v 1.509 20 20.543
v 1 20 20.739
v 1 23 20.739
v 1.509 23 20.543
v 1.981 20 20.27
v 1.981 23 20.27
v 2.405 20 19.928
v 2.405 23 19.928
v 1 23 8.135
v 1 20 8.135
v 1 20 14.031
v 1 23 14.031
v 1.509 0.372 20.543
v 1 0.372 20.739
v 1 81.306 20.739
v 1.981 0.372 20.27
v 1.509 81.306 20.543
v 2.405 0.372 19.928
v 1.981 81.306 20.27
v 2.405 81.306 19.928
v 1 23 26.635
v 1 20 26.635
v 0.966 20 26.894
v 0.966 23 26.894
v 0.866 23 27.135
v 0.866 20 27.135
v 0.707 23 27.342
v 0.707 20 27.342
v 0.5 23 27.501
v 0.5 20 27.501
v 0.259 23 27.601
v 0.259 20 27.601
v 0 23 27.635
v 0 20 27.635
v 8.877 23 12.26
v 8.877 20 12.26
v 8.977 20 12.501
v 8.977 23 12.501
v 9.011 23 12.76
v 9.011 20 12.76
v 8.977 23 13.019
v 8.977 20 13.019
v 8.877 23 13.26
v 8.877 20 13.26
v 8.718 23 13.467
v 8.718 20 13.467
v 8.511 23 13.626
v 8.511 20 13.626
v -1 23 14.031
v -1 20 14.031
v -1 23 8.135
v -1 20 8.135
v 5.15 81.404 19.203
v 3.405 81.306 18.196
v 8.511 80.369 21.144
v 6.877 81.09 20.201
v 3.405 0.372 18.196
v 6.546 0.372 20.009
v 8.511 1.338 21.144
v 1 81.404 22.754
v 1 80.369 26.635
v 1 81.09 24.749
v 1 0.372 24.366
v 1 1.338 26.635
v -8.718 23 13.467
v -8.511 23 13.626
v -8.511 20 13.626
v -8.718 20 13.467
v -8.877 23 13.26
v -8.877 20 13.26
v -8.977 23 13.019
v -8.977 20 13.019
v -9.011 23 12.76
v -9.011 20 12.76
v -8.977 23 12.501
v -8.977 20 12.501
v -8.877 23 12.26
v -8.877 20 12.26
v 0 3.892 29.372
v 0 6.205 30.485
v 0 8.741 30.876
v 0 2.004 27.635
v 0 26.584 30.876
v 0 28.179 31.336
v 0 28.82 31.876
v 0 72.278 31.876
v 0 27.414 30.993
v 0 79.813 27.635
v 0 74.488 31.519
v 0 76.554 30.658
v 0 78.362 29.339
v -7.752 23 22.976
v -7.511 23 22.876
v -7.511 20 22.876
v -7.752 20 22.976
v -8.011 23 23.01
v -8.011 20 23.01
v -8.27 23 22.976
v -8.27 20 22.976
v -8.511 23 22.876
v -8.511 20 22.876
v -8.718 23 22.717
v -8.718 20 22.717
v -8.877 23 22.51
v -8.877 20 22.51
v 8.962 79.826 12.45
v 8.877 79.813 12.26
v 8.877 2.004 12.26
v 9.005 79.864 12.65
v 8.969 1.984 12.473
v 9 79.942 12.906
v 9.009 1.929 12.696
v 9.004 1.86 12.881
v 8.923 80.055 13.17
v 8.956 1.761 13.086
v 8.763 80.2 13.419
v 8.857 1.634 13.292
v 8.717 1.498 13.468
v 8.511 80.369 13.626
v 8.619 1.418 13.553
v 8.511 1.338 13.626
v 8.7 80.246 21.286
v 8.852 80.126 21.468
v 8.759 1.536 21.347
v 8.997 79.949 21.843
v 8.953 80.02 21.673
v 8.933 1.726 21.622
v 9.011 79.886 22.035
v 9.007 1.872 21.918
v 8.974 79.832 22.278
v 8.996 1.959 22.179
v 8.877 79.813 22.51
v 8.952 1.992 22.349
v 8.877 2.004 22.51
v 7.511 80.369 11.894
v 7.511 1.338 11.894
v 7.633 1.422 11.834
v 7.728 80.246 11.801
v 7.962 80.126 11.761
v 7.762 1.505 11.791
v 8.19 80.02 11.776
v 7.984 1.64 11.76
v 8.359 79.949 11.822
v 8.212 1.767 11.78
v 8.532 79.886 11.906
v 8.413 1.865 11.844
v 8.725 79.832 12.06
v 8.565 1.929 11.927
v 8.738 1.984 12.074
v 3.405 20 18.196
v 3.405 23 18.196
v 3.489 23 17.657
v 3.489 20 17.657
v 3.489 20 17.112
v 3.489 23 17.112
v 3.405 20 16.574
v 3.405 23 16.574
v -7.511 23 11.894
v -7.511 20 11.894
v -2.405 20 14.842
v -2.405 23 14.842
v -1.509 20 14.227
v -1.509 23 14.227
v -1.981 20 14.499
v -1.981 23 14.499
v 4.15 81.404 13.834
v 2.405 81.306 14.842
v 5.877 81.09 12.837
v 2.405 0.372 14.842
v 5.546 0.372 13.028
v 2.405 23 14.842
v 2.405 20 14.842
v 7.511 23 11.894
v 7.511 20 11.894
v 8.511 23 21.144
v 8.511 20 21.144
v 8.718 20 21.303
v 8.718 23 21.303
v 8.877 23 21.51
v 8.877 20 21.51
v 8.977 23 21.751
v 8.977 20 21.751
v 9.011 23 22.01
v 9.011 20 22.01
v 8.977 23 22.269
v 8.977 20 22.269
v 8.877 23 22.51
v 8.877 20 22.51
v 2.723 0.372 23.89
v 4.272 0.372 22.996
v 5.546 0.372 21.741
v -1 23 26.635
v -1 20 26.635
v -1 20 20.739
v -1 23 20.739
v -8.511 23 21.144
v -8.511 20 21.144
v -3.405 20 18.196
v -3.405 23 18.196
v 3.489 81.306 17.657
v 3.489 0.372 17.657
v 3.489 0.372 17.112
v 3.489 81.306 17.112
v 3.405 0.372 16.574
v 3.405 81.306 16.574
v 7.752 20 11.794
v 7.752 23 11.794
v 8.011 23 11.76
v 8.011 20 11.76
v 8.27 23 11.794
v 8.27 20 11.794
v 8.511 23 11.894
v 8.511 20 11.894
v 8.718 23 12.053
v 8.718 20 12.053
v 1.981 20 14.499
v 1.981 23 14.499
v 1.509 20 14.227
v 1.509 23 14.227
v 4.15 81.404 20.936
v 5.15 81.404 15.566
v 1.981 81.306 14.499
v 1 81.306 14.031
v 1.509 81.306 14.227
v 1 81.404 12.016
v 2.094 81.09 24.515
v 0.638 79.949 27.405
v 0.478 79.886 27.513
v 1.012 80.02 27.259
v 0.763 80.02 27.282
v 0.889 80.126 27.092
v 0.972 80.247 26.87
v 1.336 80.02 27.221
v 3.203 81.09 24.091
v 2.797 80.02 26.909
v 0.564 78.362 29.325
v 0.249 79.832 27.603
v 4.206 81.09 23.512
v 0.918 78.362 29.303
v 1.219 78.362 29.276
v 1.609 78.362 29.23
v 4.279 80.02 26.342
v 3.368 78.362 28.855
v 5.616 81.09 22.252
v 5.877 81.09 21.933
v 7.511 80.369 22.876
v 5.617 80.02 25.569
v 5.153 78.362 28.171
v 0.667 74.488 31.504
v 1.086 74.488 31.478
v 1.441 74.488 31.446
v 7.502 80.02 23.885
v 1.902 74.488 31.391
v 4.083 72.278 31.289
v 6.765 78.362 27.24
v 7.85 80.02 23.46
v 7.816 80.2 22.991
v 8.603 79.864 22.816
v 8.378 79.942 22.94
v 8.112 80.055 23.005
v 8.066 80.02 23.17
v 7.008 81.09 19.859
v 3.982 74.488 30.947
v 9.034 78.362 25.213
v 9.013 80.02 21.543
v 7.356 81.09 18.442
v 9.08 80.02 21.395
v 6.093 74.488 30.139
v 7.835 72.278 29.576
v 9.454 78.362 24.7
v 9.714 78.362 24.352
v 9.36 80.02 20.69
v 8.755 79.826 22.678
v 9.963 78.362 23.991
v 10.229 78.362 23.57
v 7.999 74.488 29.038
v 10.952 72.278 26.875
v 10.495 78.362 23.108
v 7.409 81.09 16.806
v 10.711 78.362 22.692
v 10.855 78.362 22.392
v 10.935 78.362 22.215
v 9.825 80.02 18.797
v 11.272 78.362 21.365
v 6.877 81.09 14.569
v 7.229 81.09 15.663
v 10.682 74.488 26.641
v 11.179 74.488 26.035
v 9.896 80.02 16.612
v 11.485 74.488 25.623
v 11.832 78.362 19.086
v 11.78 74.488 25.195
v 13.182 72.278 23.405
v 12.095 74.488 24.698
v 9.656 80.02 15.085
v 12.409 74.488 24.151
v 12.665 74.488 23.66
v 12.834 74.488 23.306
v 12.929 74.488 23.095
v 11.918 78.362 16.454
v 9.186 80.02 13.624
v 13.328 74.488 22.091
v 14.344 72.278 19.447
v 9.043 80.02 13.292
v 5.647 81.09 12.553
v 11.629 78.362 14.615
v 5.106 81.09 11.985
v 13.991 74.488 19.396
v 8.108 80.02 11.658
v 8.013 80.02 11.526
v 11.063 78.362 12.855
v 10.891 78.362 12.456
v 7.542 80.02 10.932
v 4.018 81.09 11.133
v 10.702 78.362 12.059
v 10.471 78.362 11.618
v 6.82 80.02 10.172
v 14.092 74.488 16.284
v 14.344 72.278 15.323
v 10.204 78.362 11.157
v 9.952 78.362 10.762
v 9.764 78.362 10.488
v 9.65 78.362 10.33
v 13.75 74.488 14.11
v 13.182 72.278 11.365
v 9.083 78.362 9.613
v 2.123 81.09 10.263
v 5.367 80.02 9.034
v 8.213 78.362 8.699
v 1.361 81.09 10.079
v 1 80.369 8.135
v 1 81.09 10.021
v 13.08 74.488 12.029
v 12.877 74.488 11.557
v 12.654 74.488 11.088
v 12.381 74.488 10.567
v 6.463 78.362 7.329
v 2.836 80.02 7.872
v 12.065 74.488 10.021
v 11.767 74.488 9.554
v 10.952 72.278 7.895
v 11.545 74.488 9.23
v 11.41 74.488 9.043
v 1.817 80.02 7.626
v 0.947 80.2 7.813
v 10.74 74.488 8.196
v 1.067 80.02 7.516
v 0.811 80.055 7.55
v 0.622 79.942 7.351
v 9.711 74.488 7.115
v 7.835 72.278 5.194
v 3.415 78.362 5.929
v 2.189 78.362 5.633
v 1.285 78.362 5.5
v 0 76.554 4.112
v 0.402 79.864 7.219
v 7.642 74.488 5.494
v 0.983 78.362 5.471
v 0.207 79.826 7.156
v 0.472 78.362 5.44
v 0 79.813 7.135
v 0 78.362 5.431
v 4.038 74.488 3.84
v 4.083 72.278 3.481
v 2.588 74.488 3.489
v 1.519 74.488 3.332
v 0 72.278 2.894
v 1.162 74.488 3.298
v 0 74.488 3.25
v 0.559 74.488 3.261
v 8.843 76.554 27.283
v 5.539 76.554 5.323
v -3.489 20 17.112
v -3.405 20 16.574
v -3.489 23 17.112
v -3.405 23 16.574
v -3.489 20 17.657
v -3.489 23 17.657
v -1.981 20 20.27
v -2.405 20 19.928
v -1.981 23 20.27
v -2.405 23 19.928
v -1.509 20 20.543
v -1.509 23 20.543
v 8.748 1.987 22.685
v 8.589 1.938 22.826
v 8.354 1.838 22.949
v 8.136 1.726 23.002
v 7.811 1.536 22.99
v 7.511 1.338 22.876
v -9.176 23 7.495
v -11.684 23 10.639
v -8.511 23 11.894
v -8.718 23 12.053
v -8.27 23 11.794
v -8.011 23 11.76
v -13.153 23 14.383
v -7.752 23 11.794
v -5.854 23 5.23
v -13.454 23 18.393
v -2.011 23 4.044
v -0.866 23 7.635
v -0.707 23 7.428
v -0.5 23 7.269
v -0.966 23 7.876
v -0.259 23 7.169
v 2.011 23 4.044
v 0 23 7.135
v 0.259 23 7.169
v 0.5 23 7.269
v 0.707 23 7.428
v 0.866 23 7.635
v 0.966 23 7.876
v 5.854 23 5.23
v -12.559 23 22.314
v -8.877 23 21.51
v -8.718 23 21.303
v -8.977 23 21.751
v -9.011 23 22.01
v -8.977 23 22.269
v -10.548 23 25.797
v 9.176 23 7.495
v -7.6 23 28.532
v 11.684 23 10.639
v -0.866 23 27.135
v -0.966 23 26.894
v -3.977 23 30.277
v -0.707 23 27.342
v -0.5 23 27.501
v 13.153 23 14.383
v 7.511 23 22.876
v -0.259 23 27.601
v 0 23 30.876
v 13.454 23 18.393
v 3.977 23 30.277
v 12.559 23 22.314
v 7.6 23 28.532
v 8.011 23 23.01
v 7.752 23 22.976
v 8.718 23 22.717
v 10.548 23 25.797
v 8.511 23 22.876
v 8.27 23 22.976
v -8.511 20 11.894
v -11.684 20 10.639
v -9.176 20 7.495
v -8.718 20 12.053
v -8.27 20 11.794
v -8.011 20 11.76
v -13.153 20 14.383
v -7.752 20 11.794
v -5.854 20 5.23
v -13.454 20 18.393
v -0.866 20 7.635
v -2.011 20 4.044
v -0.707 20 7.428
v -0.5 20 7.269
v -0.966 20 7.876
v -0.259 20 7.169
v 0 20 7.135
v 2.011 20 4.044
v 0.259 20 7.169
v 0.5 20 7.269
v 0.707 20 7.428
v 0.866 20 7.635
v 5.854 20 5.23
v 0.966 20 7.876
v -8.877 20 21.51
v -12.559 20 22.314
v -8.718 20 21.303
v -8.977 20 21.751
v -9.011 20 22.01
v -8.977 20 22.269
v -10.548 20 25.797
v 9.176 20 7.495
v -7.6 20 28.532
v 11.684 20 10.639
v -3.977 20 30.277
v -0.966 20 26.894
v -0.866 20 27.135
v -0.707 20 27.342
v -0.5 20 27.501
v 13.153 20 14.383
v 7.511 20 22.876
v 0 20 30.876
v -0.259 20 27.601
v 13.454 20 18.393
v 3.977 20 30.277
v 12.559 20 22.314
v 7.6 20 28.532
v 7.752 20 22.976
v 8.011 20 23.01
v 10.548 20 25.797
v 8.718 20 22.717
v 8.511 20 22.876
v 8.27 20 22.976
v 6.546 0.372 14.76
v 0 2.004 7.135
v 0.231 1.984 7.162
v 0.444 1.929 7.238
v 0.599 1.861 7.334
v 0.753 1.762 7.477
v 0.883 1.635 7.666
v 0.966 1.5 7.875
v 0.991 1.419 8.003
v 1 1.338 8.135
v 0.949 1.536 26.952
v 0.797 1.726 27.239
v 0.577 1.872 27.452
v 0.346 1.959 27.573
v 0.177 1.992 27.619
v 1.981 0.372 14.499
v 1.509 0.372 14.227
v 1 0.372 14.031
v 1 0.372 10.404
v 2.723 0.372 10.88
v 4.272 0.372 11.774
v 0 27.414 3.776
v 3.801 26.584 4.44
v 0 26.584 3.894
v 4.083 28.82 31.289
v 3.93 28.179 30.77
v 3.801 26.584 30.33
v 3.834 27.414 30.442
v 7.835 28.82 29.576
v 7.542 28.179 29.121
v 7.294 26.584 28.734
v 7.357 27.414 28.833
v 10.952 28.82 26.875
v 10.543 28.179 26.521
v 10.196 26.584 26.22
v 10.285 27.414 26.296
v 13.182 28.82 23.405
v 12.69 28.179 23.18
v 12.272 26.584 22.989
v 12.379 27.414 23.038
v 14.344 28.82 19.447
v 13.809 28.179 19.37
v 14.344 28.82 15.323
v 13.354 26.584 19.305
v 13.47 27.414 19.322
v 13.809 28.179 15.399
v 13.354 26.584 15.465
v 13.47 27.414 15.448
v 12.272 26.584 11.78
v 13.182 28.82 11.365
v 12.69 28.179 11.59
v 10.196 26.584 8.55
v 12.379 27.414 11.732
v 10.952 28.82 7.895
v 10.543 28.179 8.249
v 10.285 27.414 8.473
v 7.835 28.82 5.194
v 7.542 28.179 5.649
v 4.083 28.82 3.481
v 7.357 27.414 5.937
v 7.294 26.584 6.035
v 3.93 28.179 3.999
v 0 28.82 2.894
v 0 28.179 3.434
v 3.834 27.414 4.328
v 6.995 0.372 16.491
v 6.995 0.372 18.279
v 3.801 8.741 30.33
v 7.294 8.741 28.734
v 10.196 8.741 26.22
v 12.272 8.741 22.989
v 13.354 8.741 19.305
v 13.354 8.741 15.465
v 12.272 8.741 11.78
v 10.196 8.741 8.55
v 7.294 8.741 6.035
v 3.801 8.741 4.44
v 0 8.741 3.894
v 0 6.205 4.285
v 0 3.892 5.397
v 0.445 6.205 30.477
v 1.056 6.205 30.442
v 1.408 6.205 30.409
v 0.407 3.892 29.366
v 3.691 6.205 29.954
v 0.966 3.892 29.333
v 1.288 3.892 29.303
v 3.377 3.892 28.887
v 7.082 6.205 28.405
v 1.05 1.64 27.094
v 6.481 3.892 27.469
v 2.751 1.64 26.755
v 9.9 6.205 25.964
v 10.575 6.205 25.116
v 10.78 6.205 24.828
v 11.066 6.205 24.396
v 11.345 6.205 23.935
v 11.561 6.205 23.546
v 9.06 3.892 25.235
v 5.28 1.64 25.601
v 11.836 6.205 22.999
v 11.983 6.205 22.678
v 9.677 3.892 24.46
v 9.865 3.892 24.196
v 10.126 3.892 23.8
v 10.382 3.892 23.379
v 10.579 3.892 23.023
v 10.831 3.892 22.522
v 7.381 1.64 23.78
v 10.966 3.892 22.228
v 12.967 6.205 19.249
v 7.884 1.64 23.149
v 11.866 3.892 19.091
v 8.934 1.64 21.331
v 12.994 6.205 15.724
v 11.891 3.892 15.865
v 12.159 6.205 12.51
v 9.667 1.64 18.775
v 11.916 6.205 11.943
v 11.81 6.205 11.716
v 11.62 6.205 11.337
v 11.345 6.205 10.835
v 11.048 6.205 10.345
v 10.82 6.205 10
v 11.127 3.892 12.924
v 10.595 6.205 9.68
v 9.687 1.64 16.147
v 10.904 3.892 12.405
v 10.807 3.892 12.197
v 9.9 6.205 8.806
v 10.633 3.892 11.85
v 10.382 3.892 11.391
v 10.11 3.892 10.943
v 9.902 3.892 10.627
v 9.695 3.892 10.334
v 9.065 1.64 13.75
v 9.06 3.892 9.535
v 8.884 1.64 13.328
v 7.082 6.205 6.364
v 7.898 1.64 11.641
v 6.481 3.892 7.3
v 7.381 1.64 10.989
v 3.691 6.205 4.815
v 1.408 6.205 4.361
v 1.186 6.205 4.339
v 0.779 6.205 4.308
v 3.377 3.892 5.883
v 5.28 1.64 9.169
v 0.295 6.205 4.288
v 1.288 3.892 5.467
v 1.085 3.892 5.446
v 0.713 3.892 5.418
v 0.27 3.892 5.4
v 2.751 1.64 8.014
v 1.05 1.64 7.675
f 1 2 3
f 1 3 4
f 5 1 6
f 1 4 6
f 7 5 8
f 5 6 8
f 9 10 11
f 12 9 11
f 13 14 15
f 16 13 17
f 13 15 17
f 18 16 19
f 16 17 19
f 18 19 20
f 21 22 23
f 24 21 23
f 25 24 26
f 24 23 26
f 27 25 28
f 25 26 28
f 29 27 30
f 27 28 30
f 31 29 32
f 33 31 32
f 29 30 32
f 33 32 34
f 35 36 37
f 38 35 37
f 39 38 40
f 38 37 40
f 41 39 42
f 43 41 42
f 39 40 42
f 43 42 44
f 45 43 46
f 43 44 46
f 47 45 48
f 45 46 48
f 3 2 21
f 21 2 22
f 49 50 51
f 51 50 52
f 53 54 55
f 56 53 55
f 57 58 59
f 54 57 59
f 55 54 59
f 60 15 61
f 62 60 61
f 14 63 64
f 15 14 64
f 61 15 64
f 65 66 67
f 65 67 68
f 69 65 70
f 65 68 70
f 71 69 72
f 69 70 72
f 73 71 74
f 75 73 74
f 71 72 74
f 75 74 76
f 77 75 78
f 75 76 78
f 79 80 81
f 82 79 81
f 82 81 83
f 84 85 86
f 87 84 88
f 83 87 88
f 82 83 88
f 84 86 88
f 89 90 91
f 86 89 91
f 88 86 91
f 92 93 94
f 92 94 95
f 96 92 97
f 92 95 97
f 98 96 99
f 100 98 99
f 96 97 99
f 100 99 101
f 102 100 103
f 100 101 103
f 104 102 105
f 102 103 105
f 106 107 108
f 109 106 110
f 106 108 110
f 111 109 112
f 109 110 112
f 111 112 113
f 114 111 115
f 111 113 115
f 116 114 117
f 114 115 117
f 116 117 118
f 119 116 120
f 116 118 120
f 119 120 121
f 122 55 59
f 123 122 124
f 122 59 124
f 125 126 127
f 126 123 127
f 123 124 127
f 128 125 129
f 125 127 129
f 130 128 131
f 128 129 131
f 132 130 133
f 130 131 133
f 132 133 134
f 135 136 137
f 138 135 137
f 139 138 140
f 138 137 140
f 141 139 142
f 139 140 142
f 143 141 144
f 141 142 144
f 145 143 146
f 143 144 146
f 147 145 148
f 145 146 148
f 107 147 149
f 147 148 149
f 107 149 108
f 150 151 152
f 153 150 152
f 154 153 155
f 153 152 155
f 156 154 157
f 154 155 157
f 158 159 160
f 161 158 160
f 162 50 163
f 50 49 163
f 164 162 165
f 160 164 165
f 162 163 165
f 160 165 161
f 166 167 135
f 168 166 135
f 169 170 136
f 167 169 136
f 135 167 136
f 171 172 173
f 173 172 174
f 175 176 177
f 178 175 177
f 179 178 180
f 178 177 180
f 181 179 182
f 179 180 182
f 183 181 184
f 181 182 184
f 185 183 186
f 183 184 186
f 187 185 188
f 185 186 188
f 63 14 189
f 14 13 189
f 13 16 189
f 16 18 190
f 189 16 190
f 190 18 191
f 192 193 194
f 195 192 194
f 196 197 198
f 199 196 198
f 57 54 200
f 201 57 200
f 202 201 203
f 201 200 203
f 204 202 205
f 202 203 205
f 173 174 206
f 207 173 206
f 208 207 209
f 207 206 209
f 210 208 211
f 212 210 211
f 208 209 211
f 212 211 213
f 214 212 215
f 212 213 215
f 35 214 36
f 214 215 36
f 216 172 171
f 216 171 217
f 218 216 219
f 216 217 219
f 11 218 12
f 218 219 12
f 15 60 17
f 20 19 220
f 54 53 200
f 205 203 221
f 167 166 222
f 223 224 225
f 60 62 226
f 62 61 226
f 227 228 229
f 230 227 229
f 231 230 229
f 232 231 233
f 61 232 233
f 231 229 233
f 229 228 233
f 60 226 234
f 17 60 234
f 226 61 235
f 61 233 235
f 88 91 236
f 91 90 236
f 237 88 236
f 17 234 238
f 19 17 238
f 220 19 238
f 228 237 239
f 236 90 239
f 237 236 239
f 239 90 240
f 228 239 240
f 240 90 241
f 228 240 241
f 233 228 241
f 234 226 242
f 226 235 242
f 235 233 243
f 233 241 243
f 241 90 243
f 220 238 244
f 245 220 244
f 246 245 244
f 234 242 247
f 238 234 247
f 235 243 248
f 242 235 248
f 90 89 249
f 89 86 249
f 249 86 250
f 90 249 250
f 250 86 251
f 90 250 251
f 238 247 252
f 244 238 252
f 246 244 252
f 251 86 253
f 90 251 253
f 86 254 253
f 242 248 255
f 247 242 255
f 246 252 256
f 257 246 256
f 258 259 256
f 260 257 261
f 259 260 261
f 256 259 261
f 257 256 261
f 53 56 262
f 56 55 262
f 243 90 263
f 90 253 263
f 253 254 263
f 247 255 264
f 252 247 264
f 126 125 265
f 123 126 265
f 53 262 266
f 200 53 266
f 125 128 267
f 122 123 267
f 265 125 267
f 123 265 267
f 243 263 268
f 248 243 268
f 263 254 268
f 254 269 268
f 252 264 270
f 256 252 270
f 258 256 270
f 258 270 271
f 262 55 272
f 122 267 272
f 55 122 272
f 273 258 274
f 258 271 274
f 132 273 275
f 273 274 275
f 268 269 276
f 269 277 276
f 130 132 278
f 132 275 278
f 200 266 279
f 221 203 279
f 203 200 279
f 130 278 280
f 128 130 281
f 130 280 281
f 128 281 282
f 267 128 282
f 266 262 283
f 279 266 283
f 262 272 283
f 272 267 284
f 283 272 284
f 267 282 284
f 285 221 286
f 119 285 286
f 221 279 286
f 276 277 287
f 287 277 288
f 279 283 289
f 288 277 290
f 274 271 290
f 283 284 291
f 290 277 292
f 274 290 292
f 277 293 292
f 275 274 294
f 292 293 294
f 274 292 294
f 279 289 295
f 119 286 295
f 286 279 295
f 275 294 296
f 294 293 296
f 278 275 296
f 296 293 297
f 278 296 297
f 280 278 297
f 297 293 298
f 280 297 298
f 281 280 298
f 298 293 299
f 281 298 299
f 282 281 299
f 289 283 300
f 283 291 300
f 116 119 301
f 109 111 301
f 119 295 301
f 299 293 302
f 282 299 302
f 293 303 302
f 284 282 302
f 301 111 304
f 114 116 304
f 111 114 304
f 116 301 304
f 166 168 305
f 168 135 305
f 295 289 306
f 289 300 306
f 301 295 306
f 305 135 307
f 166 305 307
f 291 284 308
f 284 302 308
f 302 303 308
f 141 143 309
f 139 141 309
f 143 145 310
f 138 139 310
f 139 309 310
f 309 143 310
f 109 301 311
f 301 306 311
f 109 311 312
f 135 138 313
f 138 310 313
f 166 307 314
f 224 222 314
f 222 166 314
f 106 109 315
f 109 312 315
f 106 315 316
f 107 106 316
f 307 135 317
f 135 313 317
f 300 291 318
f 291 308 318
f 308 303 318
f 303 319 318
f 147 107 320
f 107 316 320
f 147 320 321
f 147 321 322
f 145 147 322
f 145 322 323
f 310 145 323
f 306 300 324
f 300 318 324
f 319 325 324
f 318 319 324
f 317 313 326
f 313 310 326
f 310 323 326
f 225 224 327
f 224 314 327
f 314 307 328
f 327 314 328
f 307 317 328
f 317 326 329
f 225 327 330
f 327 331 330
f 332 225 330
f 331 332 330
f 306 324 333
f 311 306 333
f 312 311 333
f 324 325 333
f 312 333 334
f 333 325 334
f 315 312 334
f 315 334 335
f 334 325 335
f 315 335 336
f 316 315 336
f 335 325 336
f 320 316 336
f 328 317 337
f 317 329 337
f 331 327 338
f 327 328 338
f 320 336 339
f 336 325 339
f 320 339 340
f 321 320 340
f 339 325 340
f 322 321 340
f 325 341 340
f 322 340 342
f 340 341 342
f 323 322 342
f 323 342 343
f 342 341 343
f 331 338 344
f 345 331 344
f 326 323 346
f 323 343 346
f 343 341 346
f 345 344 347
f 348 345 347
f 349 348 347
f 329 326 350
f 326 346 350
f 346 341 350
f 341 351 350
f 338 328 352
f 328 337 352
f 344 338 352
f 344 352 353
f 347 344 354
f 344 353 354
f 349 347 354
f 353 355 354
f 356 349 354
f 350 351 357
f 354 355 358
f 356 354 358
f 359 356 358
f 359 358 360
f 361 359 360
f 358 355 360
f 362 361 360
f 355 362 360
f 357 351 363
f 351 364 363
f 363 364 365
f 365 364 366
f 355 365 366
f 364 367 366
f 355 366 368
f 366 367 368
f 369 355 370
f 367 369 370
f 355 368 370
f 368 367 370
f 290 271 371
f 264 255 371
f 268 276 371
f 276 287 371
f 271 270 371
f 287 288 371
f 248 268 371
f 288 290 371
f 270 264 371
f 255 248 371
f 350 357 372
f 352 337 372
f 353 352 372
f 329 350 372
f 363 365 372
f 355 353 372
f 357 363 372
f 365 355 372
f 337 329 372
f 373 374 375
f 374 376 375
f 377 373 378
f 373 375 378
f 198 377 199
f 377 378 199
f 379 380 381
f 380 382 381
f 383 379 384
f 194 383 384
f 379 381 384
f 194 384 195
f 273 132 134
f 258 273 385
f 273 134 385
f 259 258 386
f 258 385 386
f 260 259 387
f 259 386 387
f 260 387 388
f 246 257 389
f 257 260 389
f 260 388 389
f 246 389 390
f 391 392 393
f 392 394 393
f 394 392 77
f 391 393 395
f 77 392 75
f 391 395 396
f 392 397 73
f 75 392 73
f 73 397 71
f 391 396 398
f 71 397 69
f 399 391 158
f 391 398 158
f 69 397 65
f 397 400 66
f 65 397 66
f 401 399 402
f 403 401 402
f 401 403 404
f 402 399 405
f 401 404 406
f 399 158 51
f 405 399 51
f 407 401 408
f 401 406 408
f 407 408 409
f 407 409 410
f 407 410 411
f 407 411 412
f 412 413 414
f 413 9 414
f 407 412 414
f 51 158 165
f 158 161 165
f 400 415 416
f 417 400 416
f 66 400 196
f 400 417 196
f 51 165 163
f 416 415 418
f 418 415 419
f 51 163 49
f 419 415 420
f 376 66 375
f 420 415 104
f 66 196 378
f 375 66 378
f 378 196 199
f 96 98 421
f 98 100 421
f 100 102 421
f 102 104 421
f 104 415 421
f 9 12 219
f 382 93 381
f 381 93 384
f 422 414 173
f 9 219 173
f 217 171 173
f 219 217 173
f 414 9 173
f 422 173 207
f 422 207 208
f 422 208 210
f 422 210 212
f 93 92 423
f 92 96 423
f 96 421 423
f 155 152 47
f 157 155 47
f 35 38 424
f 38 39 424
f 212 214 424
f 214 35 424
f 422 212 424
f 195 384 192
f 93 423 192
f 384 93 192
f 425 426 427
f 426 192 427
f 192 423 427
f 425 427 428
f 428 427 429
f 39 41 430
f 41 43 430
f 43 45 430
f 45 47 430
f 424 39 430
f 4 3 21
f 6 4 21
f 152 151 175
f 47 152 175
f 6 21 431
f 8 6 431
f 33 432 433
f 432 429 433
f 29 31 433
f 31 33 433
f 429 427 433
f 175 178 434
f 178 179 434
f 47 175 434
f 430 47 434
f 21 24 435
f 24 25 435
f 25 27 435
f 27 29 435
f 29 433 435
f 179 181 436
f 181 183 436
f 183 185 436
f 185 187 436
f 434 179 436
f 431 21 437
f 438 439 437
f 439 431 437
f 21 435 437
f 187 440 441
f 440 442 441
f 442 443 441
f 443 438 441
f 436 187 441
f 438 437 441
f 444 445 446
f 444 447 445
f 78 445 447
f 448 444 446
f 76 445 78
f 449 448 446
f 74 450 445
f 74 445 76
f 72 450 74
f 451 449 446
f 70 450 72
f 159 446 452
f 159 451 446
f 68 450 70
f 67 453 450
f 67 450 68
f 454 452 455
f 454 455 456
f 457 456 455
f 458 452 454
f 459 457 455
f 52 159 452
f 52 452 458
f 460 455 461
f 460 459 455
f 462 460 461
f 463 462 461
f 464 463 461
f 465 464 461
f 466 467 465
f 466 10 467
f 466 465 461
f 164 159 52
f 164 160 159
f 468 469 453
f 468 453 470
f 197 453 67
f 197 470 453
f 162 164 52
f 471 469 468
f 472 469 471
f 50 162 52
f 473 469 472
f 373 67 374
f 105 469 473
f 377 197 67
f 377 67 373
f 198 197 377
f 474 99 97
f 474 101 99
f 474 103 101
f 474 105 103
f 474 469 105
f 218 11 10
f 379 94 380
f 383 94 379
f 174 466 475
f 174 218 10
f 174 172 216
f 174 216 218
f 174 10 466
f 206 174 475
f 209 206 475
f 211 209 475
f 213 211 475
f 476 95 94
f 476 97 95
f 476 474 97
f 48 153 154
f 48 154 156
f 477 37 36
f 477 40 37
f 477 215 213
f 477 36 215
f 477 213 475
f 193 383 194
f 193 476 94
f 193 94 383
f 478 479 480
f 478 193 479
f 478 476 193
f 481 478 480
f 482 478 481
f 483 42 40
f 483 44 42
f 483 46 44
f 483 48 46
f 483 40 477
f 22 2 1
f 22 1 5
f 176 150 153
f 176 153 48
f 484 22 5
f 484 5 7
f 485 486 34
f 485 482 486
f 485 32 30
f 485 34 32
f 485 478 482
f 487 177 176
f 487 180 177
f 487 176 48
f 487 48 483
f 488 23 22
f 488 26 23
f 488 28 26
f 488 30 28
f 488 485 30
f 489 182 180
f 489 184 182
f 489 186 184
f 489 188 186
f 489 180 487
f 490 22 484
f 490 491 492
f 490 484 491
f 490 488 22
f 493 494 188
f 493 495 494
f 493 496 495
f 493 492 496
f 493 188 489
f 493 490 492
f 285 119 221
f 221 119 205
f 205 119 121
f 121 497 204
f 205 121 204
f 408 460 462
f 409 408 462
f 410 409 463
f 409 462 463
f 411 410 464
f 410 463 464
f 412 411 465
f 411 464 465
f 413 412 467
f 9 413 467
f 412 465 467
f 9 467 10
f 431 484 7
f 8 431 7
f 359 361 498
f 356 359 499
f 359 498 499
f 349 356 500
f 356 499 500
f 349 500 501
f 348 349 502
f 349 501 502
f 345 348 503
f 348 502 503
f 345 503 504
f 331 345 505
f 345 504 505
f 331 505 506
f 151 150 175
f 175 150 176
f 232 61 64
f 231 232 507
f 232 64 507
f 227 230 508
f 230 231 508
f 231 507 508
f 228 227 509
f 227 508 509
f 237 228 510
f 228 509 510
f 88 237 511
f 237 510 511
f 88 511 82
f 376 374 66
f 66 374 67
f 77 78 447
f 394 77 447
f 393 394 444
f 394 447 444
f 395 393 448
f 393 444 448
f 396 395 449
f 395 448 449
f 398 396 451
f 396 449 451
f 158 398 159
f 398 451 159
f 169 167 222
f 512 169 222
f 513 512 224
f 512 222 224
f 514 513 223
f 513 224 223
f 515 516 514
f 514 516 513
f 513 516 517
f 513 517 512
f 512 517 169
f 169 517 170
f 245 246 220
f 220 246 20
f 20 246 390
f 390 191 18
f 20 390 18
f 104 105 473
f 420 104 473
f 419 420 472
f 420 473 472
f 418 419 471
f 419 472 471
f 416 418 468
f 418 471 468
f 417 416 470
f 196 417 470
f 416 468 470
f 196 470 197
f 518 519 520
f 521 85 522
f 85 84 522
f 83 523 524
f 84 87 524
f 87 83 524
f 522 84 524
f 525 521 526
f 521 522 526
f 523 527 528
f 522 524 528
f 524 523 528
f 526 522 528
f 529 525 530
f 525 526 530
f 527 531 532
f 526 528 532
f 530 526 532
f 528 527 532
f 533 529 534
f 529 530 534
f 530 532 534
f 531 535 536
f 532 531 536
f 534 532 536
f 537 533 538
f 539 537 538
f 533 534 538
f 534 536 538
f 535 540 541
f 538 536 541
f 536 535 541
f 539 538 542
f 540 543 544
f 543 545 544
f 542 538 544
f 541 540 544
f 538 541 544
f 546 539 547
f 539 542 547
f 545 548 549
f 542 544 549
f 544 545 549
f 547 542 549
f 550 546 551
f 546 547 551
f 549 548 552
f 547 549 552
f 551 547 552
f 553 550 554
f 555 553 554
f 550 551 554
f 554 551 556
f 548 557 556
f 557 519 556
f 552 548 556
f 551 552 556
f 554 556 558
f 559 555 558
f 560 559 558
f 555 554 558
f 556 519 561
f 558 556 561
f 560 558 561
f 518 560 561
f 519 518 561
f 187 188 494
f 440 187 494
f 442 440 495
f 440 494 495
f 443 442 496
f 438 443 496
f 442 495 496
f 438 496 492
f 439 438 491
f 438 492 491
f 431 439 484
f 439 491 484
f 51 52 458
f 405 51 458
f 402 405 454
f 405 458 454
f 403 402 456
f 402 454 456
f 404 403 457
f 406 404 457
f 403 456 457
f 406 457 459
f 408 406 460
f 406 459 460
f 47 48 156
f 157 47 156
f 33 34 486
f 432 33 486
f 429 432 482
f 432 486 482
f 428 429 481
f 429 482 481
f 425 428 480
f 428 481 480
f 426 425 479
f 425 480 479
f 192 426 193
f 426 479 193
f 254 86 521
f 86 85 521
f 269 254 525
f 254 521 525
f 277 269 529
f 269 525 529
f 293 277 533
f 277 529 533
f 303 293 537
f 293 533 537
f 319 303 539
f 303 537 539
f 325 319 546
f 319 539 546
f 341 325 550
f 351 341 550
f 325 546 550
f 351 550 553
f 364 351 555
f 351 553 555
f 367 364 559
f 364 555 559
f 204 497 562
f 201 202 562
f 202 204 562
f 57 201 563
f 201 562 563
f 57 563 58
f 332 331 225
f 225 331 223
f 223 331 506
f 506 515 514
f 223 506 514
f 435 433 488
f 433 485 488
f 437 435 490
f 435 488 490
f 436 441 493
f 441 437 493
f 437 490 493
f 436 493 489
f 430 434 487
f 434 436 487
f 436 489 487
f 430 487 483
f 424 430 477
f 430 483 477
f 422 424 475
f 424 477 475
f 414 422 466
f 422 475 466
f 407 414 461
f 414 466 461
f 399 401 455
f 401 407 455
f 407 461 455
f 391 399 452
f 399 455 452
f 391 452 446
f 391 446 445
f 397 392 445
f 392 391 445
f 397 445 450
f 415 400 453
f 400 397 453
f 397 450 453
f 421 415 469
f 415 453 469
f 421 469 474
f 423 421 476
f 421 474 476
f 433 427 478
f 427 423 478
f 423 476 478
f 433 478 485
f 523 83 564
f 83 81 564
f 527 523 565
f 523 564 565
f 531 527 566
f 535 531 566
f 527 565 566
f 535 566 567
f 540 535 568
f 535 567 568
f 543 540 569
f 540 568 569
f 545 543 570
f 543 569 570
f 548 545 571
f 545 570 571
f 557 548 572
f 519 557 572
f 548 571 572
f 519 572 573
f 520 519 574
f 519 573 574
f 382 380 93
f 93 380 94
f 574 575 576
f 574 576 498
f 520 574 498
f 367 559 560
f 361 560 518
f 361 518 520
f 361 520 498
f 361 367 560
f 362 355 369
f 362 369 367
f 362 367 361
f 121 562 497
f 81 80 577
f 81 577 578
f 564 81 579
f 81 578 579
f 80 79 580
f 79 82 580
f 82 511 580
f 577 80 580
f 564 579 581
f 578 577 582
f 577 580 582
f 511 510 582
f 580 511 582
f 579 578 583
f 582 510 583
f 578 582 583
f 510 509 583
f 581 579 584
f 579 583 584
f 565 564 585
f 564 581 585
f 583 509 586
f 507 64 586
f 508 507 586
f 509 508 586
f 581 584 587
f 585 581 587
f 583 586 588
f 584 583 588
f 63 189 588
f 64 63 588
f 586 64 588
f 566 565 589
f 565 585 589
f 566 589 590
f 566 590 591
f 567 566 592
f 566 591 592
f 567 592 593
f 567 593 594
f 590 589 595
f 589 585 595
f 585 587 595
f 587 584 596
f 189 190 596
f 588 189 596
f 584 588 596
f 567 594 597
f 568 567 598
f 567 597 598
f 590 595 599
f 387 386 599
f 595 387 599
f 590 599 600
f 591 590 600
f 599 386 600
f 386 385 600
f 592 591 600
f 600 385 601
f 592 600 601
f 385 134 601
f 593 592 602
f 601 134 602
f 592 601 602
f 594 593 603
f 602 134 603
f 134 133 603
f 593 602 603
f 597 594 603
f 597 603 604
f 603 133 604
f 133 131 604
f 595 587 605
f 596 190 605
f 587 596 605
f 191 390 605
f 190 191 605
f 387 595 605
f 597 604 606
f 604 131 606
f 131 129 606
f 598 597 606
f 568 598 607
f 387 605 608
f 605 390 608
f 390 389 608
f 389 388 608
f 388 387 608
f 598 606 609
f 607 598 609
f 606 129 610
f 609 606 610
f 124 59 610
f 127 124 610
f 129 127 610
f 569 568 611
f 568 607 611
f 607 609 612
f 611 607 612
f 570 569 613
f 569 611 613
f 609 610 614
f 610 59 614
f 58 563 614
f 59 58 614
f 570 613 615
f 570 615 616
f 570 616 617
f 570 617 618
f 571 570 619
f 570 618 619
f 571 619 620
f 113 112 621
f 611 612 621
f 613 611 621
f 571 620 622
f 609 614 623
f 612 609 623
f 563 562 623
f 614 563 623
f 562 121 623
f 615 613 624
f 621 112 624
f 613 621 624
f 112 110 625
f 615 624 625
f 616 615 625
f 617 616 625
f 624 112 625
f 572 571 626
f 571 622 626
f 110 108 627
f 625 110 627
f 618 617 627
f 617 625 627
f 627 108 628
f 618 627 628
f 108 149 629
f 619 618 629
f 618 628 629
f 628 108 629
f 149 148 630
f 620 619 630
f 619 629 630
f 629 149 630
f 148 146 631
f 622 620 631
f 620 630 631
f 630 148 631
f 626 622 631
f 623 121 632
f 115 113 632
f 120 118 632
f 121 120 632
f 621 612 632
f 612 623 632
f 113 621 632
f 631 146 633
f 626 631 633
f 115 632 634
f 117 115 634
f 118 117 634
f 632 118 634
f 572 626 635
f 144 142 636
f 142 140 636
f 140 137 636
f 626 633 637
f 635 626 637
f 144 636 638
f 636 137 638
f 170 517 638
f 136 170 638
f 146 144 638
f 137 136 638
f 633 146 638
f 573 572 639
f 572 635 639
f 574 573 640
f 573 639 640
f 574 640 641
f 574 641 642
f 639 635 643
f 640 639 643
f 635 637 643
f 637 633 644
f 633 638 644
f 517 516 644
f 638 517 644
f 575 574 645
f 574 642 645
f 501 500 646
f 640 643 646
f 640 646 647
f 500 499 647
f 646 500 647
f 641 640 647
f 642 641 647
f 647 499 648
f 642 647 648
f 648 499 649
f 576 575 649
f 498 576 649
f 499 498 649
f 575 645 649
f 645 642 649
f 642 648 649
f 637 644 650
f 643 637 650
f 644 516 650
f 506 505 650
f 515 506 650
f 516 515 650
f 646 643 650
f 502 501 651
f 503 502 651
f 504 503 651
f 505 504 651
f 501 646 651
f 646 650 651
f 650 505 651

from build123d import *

# Parameters (mm, degrees)
F4_ANGLE  = 180
F6_DEPTH  = 90
F8_COUNT  = 6
F12_START = -20
F11_R     = 13.4913344195
F12_DEPTH = 3


with BuildPart() as f4:
    # F3 (on Right) → F4 (revolve)
    with BuildSketch(Plane.YZ):
        with BuildLine():
            Line((0.3716222048, 20.884835436), (81.3056033368, 20.884835436))
            ThreePointArc((81.3056033368, 20.884835436), (79.2480851868, 28.3977219469), (72.2783456923, 31.8761664331))
            Line((72.2783456923, 31.8761664331), (28.8201148927, 31.8761664331))
            ThreePointArc((28.8201148927, 31.8761664331), (27.8087917866, 31.1375536456), (26.5840469152, 30.8761664331))
            Line((26.5840469152, 30.8761664331), (8.8330505692, 30.8761664331))
            Line((8.8330505692, 30.8761664331), (8.7405150061, 30.8761664331))
            ThreePointArc((8.7405150061, 30.8761664331), (3.470465515, 29.0675325384), (0.3716222048, 24.4370089889))
            Line((0.3716222048, 24.4370089889), (0.3716222048, 20.884835436))
        make_face()
    revolve(axis=Axis((0, 40.3716222048, 17.384835436), (0, 1, 0)), revolution_arc=F4_ANGLE)


with BuildPart() as f6:
    # F5 (on Front) → F6 (new body)
    with BuildSketch(Plane.XZ):
        with BuildLine():
            ThreePointArc((1, 14.0307334698), (0, 13.884835436), (-1, 14.0307334698))
            Line((-1, 14.0307334698), (-1, 8.1346530026))
            ThreePointArc((-1, 8.1346530026), (-0.7071067812, 7.4275462214), (0, 7.1346530026))
            ThreePointArc((0, 7.1346530026), (0.7071067812, 7.4275462214), (1, 8.1346530026))
            Line((1, 8.1346530026), (1, 14.0307334698))
        make_face()
    extrude(amount=-F6_DEPTH)


with BuildPart() as f8_1:
    # F8: instance of F6
    add(f6.part.rotate(Axis((0, 20.536005497, 17.384835436), (0, 1, 0)), 1 * 360 / F8_COUNT))


with BuildPart() as f8_2:
    # F8: instance of F6
    add(f6.part.rotate(Axis((0, 20.536005497, 17.384835436), (0, 1, 0)), 2 * 360 / F8_COUNT))


with BuildPart() as f8_3:
    # F8: instance of F6
    add(f6.part.rotate(Axis((0, 20.536005497, 17.384835436), (0, 1, 0)), 3 * 360 / F8_COUNT))


with BuildPart() as f8_4:
    # F8: instance of F6
    add(f6.part.rotate(Axis((0, 20.536005497, 17.384835436), (0, 1, 0)), 4 * 360 / F8_COUNT))


with BuildPart() as f8_5:
    # F8: instance of F6
    add(f6.part.rotate(Axis((0, 20.536005497, 17.384835436), (0, 1, 0)), 5 * 360 / F8_COUNT))


with BuildPart() as f4_1:
    add(f4.part)

    # F9: cut F6, F8_5, F8_4, F8_3
    add(f6.part, mode=Mode.SUBTRACT)
    add(f8_5.part, mode=Mode.SUBTRACT)
    add(f8_4.part, mode=Mode.SUBTRACT)
    add(f8_3.part, mode=Mode.SUBTRACT)


with BuildPart() as f10:
    # F3 (on Right) → F10 (revolve)
    with BuildSketch(Plane.YZ):
        with BuildLine():
            Line((0.3716222048, 20.884835436), (81.3056033368, 20.884835436))
            ThreePointArc((81.3056033368, 20.884835436), (79.2480851868, 28.3977219469), (72.2783456923, 31.8761664331))
            Line((72.2783456923, 31.8761664331), (28.8201148927, 31.8761664331))
            ThreePointArc((28.8201148927, 31.8761664331), (27.8087917866, 31.1375536456), (26.5840469152, 30.8761664331))
            Line((26.5840469152, 30.8761664331), (8.8330505692, 30.8761664331))
            Line((8.8330505692, 30.8761664331), (8.7405150061, 30.8761664331))
            ThreePointArc((8.7405150061, 30.8761664331), (3.470465515, 29.0675325384), (0.3716222048, 24.4370089889))
            Line((0.3716222048, 24.4370089889), (0.3716222048, 20.884835436))
        make_face()
    revolve(axis=Axis((0, 40.3716222048, 17.384835436), (0, 1, 0)))

    # F13: cut F6, F8_5, F8_4, F8_3, F8_2, F8_1
    add(f6.part, mode=Mode.SUBTRACT)
    add(f8_5.part, mode=Mode.SUBTRACT)
    add(f8_4.part, mode=Mode.SUBTRACT)
    add(f8_3.part, mode=Mode.SUBTRACT)
    add(f8_2.part, mode=Mode.SUBTRACT)
    add(f8_1.part, mode=Mode.SUBTRACT)


with BuildPart() as f12:
    # F11 (on Front) → F12 (new body)
    with BuildSketch(Plane.XZ.offset(F12_START)):
        with Locations((0, 17.384835436)):
            Circle(F11_R)
    extrude(amount=-F12_DEPTH)


with BuildPart() as f10_1:
    add(f10.part)

    # F14: intersect F12
    add(f12.part, mode=Mode.INTERSECT)


solid = Compound([f4_1.part, f10_1.part])
